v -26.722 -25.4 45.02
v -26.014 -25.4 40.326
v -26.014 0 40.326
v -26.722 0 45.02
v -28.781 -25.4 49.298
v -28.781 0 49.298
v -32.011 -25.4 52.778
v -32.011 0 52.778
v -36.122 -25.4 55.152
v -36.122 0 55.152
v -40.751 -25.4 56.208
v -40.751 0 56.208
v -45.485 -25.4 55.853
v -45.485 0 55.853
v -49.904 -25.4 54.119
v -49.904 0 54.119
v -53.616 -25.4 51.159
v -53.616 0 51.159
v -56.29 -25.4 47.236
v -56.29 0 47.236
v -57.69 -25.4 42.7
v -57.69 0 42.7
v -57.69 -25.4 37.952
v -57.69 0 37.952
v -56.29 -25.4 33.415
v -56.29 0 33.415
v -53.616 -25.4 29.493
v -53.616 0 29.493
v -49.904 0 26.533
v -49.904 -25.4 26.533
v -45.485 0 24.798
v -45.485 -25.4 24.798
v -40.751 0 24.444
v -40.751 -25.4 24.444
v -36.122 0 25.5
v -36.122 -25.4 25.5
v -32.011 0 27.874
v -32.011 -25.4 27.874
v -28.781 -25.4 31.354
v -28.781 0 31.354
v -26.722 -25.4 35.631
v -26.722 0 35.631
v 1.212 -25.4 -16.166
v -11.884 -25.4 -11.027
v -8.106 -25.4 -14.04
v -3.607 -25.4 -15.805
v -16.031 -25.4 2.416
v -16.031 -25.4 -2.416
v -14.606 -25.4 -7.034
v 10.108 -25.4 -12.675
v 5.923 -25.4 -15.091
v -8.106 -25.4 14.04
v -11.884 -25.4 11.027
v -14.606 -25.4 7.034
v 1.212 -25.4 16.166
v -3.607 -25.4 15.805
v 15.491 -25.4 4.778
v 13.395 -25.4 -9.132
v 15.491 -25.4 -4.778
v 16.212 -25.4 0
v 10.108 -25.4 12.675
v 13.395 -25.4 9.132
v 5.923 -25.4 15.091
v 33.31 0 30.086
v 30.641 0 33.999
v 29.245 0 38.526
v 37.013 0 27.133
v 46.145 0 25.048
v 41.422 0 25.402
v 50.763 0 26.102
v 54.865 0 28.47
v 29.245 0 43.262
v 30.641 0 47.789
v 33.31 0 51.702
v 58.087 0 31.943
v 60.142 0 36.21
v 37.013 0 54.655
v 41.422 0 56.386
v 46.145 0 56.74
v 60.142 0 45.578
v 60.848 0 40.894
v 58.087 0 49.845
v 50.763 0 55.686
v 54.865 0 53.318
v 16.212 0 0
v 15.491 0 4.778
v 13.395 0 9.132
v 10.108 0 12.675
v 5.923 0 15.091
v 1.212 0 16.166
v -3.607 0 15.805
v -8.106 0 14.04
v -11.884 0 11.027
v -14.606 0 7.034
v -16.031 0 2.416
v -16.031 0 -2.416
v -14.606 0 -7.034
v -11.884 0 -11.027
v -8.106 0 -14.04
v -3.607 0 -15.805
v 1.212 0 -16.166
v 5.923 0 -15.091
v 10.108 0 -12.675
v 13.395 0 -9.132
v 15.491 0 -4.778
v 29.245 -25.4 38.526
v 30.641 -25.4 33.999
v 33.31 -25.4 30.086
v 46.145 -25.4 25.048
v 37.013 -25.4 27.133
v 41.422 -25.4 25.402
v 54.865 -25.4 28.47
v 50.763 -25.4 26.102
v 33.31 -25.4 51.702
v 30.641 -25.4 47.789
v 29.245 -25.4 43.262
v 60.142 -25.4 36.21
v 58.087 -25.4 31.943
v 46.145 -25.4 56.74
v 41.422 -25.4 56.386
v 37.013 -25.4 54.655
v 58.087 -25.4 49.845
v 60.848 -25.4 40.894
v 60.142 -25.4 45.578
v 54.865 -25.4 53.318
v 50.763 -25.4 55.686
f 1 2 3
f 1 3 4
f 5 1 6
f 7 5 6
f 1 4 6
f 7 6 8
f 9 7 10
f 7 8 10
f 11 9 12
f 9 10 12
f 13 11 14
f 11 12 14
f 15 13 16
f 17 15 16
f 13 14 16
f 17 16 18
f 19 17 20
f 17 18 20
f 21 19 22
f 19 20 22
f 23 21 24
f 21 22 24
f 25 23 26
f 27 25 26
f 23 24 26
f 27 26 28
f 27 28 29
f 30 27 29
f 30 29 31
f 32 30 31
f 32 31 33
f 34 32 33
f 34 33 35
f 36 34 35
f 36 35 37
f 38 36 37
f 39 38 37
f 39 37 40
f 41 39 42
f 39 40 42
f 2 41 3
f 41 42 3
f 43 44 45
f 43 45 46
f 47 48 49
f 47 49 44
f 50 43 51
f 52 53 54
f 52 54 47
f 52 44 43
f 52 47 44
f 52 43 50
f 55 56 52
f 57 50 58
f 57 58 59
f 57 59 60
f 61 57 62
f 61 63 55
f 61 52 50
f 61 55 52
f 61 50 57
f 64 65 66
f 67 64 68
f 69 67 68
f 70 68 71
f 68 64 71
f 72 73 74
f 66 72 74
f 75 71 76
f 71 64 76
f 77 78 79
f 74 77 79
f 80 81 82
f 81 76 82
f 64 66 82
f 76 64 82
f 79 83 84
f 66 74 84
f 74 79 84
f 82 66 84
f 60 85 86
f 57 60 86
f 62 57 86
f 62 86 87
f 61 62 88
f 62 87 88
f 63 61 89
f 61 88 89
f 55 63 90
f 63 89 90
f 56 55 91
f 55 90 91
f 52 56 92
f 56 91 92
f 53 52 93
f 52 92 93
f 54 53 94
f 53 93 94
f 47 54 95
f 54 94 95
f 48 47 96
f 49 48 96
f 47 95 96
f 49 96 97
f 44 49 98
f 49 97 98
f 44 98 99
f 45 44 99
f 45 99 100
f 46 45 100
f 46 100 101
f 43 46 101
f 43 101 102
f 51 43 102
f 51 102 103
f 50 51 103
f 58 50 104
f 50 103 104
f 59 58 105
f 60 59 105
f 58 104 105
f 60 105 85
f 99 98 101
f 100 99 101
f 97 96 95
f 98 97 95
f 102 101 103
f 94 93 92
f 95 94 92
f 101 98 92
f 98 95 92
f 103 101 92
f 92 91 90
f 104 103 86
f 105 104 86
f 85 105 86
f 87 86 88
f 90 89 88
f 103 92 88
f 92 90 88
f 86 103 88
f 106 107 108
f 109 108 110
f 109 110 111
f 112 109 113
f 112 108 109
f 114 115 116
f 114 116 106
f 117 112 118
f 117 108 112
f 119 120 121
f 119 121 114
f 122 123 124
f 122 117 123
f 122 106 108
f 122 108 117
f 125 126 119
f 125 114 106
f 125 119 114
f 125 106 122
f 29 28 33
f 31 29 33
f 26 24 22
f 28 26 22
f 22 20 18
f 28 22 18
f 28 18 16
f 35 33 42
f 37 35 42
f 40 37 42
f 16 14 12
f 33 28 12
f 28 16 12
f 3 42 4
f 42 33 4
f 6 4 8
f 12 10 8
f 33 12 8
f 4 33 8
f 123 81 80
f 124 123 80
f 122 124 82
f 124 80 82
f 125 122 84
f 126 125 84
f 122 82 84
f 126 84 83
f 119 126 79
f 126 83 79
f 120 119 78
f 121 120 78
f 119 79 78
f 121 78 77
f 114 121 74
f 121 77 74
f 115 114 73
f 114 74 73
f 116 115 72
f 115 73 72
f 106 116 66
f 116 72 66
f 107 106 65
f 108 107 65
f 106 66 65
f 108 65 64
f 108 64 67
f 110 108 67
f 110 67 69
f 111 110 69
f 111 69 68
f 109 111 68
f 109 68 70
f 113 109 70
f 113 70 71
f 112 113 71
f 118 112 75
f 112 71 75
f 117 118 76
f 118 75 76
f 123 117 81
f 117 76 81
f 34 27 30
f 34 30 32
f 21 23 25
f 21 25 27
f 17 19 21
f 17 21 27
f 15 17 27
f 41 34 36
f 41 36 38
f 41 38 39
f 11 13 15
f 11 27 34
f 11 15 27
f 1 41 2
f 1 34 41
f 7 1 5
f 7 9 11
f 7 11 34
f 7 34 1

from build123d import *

# Parameters (mm, degrees)
F0_R     = 16.211686
F1_DEPTH = 25.4
F2_R     = 15.926725
F2_R_2   = 16.123972
F3_DEPTH = 25.4
F4_R     = 15.890332
F5_DEPTH = 25.4


with BuildPart() as f1:
    # F0 (on Front) → F1 (new body)
    with BuildSketch(Plane.XZ):
        Circle(F0_R)
    extrude(amount=F1_DEPTH)

    # F2 (on Front) → F3 (join)
    with BuildSketch(Plane.XZ):
        with Locations((-41.940726, 40.325791)):
            Circle(F2_R)
        Circle(F2_R_2)
    extrude(amount=F3_DEPTH)


with BuildPart() as f5:
    # F4 (on Front) → F5 (new body)
    with BuildSketch(Plane.XZ):
        with Locations((44.957999, 40.894005)):
            Circle(F4_R)
    extrude(amount=F5_DEPTH)


solid = Compound([f1.part, f5.part])
